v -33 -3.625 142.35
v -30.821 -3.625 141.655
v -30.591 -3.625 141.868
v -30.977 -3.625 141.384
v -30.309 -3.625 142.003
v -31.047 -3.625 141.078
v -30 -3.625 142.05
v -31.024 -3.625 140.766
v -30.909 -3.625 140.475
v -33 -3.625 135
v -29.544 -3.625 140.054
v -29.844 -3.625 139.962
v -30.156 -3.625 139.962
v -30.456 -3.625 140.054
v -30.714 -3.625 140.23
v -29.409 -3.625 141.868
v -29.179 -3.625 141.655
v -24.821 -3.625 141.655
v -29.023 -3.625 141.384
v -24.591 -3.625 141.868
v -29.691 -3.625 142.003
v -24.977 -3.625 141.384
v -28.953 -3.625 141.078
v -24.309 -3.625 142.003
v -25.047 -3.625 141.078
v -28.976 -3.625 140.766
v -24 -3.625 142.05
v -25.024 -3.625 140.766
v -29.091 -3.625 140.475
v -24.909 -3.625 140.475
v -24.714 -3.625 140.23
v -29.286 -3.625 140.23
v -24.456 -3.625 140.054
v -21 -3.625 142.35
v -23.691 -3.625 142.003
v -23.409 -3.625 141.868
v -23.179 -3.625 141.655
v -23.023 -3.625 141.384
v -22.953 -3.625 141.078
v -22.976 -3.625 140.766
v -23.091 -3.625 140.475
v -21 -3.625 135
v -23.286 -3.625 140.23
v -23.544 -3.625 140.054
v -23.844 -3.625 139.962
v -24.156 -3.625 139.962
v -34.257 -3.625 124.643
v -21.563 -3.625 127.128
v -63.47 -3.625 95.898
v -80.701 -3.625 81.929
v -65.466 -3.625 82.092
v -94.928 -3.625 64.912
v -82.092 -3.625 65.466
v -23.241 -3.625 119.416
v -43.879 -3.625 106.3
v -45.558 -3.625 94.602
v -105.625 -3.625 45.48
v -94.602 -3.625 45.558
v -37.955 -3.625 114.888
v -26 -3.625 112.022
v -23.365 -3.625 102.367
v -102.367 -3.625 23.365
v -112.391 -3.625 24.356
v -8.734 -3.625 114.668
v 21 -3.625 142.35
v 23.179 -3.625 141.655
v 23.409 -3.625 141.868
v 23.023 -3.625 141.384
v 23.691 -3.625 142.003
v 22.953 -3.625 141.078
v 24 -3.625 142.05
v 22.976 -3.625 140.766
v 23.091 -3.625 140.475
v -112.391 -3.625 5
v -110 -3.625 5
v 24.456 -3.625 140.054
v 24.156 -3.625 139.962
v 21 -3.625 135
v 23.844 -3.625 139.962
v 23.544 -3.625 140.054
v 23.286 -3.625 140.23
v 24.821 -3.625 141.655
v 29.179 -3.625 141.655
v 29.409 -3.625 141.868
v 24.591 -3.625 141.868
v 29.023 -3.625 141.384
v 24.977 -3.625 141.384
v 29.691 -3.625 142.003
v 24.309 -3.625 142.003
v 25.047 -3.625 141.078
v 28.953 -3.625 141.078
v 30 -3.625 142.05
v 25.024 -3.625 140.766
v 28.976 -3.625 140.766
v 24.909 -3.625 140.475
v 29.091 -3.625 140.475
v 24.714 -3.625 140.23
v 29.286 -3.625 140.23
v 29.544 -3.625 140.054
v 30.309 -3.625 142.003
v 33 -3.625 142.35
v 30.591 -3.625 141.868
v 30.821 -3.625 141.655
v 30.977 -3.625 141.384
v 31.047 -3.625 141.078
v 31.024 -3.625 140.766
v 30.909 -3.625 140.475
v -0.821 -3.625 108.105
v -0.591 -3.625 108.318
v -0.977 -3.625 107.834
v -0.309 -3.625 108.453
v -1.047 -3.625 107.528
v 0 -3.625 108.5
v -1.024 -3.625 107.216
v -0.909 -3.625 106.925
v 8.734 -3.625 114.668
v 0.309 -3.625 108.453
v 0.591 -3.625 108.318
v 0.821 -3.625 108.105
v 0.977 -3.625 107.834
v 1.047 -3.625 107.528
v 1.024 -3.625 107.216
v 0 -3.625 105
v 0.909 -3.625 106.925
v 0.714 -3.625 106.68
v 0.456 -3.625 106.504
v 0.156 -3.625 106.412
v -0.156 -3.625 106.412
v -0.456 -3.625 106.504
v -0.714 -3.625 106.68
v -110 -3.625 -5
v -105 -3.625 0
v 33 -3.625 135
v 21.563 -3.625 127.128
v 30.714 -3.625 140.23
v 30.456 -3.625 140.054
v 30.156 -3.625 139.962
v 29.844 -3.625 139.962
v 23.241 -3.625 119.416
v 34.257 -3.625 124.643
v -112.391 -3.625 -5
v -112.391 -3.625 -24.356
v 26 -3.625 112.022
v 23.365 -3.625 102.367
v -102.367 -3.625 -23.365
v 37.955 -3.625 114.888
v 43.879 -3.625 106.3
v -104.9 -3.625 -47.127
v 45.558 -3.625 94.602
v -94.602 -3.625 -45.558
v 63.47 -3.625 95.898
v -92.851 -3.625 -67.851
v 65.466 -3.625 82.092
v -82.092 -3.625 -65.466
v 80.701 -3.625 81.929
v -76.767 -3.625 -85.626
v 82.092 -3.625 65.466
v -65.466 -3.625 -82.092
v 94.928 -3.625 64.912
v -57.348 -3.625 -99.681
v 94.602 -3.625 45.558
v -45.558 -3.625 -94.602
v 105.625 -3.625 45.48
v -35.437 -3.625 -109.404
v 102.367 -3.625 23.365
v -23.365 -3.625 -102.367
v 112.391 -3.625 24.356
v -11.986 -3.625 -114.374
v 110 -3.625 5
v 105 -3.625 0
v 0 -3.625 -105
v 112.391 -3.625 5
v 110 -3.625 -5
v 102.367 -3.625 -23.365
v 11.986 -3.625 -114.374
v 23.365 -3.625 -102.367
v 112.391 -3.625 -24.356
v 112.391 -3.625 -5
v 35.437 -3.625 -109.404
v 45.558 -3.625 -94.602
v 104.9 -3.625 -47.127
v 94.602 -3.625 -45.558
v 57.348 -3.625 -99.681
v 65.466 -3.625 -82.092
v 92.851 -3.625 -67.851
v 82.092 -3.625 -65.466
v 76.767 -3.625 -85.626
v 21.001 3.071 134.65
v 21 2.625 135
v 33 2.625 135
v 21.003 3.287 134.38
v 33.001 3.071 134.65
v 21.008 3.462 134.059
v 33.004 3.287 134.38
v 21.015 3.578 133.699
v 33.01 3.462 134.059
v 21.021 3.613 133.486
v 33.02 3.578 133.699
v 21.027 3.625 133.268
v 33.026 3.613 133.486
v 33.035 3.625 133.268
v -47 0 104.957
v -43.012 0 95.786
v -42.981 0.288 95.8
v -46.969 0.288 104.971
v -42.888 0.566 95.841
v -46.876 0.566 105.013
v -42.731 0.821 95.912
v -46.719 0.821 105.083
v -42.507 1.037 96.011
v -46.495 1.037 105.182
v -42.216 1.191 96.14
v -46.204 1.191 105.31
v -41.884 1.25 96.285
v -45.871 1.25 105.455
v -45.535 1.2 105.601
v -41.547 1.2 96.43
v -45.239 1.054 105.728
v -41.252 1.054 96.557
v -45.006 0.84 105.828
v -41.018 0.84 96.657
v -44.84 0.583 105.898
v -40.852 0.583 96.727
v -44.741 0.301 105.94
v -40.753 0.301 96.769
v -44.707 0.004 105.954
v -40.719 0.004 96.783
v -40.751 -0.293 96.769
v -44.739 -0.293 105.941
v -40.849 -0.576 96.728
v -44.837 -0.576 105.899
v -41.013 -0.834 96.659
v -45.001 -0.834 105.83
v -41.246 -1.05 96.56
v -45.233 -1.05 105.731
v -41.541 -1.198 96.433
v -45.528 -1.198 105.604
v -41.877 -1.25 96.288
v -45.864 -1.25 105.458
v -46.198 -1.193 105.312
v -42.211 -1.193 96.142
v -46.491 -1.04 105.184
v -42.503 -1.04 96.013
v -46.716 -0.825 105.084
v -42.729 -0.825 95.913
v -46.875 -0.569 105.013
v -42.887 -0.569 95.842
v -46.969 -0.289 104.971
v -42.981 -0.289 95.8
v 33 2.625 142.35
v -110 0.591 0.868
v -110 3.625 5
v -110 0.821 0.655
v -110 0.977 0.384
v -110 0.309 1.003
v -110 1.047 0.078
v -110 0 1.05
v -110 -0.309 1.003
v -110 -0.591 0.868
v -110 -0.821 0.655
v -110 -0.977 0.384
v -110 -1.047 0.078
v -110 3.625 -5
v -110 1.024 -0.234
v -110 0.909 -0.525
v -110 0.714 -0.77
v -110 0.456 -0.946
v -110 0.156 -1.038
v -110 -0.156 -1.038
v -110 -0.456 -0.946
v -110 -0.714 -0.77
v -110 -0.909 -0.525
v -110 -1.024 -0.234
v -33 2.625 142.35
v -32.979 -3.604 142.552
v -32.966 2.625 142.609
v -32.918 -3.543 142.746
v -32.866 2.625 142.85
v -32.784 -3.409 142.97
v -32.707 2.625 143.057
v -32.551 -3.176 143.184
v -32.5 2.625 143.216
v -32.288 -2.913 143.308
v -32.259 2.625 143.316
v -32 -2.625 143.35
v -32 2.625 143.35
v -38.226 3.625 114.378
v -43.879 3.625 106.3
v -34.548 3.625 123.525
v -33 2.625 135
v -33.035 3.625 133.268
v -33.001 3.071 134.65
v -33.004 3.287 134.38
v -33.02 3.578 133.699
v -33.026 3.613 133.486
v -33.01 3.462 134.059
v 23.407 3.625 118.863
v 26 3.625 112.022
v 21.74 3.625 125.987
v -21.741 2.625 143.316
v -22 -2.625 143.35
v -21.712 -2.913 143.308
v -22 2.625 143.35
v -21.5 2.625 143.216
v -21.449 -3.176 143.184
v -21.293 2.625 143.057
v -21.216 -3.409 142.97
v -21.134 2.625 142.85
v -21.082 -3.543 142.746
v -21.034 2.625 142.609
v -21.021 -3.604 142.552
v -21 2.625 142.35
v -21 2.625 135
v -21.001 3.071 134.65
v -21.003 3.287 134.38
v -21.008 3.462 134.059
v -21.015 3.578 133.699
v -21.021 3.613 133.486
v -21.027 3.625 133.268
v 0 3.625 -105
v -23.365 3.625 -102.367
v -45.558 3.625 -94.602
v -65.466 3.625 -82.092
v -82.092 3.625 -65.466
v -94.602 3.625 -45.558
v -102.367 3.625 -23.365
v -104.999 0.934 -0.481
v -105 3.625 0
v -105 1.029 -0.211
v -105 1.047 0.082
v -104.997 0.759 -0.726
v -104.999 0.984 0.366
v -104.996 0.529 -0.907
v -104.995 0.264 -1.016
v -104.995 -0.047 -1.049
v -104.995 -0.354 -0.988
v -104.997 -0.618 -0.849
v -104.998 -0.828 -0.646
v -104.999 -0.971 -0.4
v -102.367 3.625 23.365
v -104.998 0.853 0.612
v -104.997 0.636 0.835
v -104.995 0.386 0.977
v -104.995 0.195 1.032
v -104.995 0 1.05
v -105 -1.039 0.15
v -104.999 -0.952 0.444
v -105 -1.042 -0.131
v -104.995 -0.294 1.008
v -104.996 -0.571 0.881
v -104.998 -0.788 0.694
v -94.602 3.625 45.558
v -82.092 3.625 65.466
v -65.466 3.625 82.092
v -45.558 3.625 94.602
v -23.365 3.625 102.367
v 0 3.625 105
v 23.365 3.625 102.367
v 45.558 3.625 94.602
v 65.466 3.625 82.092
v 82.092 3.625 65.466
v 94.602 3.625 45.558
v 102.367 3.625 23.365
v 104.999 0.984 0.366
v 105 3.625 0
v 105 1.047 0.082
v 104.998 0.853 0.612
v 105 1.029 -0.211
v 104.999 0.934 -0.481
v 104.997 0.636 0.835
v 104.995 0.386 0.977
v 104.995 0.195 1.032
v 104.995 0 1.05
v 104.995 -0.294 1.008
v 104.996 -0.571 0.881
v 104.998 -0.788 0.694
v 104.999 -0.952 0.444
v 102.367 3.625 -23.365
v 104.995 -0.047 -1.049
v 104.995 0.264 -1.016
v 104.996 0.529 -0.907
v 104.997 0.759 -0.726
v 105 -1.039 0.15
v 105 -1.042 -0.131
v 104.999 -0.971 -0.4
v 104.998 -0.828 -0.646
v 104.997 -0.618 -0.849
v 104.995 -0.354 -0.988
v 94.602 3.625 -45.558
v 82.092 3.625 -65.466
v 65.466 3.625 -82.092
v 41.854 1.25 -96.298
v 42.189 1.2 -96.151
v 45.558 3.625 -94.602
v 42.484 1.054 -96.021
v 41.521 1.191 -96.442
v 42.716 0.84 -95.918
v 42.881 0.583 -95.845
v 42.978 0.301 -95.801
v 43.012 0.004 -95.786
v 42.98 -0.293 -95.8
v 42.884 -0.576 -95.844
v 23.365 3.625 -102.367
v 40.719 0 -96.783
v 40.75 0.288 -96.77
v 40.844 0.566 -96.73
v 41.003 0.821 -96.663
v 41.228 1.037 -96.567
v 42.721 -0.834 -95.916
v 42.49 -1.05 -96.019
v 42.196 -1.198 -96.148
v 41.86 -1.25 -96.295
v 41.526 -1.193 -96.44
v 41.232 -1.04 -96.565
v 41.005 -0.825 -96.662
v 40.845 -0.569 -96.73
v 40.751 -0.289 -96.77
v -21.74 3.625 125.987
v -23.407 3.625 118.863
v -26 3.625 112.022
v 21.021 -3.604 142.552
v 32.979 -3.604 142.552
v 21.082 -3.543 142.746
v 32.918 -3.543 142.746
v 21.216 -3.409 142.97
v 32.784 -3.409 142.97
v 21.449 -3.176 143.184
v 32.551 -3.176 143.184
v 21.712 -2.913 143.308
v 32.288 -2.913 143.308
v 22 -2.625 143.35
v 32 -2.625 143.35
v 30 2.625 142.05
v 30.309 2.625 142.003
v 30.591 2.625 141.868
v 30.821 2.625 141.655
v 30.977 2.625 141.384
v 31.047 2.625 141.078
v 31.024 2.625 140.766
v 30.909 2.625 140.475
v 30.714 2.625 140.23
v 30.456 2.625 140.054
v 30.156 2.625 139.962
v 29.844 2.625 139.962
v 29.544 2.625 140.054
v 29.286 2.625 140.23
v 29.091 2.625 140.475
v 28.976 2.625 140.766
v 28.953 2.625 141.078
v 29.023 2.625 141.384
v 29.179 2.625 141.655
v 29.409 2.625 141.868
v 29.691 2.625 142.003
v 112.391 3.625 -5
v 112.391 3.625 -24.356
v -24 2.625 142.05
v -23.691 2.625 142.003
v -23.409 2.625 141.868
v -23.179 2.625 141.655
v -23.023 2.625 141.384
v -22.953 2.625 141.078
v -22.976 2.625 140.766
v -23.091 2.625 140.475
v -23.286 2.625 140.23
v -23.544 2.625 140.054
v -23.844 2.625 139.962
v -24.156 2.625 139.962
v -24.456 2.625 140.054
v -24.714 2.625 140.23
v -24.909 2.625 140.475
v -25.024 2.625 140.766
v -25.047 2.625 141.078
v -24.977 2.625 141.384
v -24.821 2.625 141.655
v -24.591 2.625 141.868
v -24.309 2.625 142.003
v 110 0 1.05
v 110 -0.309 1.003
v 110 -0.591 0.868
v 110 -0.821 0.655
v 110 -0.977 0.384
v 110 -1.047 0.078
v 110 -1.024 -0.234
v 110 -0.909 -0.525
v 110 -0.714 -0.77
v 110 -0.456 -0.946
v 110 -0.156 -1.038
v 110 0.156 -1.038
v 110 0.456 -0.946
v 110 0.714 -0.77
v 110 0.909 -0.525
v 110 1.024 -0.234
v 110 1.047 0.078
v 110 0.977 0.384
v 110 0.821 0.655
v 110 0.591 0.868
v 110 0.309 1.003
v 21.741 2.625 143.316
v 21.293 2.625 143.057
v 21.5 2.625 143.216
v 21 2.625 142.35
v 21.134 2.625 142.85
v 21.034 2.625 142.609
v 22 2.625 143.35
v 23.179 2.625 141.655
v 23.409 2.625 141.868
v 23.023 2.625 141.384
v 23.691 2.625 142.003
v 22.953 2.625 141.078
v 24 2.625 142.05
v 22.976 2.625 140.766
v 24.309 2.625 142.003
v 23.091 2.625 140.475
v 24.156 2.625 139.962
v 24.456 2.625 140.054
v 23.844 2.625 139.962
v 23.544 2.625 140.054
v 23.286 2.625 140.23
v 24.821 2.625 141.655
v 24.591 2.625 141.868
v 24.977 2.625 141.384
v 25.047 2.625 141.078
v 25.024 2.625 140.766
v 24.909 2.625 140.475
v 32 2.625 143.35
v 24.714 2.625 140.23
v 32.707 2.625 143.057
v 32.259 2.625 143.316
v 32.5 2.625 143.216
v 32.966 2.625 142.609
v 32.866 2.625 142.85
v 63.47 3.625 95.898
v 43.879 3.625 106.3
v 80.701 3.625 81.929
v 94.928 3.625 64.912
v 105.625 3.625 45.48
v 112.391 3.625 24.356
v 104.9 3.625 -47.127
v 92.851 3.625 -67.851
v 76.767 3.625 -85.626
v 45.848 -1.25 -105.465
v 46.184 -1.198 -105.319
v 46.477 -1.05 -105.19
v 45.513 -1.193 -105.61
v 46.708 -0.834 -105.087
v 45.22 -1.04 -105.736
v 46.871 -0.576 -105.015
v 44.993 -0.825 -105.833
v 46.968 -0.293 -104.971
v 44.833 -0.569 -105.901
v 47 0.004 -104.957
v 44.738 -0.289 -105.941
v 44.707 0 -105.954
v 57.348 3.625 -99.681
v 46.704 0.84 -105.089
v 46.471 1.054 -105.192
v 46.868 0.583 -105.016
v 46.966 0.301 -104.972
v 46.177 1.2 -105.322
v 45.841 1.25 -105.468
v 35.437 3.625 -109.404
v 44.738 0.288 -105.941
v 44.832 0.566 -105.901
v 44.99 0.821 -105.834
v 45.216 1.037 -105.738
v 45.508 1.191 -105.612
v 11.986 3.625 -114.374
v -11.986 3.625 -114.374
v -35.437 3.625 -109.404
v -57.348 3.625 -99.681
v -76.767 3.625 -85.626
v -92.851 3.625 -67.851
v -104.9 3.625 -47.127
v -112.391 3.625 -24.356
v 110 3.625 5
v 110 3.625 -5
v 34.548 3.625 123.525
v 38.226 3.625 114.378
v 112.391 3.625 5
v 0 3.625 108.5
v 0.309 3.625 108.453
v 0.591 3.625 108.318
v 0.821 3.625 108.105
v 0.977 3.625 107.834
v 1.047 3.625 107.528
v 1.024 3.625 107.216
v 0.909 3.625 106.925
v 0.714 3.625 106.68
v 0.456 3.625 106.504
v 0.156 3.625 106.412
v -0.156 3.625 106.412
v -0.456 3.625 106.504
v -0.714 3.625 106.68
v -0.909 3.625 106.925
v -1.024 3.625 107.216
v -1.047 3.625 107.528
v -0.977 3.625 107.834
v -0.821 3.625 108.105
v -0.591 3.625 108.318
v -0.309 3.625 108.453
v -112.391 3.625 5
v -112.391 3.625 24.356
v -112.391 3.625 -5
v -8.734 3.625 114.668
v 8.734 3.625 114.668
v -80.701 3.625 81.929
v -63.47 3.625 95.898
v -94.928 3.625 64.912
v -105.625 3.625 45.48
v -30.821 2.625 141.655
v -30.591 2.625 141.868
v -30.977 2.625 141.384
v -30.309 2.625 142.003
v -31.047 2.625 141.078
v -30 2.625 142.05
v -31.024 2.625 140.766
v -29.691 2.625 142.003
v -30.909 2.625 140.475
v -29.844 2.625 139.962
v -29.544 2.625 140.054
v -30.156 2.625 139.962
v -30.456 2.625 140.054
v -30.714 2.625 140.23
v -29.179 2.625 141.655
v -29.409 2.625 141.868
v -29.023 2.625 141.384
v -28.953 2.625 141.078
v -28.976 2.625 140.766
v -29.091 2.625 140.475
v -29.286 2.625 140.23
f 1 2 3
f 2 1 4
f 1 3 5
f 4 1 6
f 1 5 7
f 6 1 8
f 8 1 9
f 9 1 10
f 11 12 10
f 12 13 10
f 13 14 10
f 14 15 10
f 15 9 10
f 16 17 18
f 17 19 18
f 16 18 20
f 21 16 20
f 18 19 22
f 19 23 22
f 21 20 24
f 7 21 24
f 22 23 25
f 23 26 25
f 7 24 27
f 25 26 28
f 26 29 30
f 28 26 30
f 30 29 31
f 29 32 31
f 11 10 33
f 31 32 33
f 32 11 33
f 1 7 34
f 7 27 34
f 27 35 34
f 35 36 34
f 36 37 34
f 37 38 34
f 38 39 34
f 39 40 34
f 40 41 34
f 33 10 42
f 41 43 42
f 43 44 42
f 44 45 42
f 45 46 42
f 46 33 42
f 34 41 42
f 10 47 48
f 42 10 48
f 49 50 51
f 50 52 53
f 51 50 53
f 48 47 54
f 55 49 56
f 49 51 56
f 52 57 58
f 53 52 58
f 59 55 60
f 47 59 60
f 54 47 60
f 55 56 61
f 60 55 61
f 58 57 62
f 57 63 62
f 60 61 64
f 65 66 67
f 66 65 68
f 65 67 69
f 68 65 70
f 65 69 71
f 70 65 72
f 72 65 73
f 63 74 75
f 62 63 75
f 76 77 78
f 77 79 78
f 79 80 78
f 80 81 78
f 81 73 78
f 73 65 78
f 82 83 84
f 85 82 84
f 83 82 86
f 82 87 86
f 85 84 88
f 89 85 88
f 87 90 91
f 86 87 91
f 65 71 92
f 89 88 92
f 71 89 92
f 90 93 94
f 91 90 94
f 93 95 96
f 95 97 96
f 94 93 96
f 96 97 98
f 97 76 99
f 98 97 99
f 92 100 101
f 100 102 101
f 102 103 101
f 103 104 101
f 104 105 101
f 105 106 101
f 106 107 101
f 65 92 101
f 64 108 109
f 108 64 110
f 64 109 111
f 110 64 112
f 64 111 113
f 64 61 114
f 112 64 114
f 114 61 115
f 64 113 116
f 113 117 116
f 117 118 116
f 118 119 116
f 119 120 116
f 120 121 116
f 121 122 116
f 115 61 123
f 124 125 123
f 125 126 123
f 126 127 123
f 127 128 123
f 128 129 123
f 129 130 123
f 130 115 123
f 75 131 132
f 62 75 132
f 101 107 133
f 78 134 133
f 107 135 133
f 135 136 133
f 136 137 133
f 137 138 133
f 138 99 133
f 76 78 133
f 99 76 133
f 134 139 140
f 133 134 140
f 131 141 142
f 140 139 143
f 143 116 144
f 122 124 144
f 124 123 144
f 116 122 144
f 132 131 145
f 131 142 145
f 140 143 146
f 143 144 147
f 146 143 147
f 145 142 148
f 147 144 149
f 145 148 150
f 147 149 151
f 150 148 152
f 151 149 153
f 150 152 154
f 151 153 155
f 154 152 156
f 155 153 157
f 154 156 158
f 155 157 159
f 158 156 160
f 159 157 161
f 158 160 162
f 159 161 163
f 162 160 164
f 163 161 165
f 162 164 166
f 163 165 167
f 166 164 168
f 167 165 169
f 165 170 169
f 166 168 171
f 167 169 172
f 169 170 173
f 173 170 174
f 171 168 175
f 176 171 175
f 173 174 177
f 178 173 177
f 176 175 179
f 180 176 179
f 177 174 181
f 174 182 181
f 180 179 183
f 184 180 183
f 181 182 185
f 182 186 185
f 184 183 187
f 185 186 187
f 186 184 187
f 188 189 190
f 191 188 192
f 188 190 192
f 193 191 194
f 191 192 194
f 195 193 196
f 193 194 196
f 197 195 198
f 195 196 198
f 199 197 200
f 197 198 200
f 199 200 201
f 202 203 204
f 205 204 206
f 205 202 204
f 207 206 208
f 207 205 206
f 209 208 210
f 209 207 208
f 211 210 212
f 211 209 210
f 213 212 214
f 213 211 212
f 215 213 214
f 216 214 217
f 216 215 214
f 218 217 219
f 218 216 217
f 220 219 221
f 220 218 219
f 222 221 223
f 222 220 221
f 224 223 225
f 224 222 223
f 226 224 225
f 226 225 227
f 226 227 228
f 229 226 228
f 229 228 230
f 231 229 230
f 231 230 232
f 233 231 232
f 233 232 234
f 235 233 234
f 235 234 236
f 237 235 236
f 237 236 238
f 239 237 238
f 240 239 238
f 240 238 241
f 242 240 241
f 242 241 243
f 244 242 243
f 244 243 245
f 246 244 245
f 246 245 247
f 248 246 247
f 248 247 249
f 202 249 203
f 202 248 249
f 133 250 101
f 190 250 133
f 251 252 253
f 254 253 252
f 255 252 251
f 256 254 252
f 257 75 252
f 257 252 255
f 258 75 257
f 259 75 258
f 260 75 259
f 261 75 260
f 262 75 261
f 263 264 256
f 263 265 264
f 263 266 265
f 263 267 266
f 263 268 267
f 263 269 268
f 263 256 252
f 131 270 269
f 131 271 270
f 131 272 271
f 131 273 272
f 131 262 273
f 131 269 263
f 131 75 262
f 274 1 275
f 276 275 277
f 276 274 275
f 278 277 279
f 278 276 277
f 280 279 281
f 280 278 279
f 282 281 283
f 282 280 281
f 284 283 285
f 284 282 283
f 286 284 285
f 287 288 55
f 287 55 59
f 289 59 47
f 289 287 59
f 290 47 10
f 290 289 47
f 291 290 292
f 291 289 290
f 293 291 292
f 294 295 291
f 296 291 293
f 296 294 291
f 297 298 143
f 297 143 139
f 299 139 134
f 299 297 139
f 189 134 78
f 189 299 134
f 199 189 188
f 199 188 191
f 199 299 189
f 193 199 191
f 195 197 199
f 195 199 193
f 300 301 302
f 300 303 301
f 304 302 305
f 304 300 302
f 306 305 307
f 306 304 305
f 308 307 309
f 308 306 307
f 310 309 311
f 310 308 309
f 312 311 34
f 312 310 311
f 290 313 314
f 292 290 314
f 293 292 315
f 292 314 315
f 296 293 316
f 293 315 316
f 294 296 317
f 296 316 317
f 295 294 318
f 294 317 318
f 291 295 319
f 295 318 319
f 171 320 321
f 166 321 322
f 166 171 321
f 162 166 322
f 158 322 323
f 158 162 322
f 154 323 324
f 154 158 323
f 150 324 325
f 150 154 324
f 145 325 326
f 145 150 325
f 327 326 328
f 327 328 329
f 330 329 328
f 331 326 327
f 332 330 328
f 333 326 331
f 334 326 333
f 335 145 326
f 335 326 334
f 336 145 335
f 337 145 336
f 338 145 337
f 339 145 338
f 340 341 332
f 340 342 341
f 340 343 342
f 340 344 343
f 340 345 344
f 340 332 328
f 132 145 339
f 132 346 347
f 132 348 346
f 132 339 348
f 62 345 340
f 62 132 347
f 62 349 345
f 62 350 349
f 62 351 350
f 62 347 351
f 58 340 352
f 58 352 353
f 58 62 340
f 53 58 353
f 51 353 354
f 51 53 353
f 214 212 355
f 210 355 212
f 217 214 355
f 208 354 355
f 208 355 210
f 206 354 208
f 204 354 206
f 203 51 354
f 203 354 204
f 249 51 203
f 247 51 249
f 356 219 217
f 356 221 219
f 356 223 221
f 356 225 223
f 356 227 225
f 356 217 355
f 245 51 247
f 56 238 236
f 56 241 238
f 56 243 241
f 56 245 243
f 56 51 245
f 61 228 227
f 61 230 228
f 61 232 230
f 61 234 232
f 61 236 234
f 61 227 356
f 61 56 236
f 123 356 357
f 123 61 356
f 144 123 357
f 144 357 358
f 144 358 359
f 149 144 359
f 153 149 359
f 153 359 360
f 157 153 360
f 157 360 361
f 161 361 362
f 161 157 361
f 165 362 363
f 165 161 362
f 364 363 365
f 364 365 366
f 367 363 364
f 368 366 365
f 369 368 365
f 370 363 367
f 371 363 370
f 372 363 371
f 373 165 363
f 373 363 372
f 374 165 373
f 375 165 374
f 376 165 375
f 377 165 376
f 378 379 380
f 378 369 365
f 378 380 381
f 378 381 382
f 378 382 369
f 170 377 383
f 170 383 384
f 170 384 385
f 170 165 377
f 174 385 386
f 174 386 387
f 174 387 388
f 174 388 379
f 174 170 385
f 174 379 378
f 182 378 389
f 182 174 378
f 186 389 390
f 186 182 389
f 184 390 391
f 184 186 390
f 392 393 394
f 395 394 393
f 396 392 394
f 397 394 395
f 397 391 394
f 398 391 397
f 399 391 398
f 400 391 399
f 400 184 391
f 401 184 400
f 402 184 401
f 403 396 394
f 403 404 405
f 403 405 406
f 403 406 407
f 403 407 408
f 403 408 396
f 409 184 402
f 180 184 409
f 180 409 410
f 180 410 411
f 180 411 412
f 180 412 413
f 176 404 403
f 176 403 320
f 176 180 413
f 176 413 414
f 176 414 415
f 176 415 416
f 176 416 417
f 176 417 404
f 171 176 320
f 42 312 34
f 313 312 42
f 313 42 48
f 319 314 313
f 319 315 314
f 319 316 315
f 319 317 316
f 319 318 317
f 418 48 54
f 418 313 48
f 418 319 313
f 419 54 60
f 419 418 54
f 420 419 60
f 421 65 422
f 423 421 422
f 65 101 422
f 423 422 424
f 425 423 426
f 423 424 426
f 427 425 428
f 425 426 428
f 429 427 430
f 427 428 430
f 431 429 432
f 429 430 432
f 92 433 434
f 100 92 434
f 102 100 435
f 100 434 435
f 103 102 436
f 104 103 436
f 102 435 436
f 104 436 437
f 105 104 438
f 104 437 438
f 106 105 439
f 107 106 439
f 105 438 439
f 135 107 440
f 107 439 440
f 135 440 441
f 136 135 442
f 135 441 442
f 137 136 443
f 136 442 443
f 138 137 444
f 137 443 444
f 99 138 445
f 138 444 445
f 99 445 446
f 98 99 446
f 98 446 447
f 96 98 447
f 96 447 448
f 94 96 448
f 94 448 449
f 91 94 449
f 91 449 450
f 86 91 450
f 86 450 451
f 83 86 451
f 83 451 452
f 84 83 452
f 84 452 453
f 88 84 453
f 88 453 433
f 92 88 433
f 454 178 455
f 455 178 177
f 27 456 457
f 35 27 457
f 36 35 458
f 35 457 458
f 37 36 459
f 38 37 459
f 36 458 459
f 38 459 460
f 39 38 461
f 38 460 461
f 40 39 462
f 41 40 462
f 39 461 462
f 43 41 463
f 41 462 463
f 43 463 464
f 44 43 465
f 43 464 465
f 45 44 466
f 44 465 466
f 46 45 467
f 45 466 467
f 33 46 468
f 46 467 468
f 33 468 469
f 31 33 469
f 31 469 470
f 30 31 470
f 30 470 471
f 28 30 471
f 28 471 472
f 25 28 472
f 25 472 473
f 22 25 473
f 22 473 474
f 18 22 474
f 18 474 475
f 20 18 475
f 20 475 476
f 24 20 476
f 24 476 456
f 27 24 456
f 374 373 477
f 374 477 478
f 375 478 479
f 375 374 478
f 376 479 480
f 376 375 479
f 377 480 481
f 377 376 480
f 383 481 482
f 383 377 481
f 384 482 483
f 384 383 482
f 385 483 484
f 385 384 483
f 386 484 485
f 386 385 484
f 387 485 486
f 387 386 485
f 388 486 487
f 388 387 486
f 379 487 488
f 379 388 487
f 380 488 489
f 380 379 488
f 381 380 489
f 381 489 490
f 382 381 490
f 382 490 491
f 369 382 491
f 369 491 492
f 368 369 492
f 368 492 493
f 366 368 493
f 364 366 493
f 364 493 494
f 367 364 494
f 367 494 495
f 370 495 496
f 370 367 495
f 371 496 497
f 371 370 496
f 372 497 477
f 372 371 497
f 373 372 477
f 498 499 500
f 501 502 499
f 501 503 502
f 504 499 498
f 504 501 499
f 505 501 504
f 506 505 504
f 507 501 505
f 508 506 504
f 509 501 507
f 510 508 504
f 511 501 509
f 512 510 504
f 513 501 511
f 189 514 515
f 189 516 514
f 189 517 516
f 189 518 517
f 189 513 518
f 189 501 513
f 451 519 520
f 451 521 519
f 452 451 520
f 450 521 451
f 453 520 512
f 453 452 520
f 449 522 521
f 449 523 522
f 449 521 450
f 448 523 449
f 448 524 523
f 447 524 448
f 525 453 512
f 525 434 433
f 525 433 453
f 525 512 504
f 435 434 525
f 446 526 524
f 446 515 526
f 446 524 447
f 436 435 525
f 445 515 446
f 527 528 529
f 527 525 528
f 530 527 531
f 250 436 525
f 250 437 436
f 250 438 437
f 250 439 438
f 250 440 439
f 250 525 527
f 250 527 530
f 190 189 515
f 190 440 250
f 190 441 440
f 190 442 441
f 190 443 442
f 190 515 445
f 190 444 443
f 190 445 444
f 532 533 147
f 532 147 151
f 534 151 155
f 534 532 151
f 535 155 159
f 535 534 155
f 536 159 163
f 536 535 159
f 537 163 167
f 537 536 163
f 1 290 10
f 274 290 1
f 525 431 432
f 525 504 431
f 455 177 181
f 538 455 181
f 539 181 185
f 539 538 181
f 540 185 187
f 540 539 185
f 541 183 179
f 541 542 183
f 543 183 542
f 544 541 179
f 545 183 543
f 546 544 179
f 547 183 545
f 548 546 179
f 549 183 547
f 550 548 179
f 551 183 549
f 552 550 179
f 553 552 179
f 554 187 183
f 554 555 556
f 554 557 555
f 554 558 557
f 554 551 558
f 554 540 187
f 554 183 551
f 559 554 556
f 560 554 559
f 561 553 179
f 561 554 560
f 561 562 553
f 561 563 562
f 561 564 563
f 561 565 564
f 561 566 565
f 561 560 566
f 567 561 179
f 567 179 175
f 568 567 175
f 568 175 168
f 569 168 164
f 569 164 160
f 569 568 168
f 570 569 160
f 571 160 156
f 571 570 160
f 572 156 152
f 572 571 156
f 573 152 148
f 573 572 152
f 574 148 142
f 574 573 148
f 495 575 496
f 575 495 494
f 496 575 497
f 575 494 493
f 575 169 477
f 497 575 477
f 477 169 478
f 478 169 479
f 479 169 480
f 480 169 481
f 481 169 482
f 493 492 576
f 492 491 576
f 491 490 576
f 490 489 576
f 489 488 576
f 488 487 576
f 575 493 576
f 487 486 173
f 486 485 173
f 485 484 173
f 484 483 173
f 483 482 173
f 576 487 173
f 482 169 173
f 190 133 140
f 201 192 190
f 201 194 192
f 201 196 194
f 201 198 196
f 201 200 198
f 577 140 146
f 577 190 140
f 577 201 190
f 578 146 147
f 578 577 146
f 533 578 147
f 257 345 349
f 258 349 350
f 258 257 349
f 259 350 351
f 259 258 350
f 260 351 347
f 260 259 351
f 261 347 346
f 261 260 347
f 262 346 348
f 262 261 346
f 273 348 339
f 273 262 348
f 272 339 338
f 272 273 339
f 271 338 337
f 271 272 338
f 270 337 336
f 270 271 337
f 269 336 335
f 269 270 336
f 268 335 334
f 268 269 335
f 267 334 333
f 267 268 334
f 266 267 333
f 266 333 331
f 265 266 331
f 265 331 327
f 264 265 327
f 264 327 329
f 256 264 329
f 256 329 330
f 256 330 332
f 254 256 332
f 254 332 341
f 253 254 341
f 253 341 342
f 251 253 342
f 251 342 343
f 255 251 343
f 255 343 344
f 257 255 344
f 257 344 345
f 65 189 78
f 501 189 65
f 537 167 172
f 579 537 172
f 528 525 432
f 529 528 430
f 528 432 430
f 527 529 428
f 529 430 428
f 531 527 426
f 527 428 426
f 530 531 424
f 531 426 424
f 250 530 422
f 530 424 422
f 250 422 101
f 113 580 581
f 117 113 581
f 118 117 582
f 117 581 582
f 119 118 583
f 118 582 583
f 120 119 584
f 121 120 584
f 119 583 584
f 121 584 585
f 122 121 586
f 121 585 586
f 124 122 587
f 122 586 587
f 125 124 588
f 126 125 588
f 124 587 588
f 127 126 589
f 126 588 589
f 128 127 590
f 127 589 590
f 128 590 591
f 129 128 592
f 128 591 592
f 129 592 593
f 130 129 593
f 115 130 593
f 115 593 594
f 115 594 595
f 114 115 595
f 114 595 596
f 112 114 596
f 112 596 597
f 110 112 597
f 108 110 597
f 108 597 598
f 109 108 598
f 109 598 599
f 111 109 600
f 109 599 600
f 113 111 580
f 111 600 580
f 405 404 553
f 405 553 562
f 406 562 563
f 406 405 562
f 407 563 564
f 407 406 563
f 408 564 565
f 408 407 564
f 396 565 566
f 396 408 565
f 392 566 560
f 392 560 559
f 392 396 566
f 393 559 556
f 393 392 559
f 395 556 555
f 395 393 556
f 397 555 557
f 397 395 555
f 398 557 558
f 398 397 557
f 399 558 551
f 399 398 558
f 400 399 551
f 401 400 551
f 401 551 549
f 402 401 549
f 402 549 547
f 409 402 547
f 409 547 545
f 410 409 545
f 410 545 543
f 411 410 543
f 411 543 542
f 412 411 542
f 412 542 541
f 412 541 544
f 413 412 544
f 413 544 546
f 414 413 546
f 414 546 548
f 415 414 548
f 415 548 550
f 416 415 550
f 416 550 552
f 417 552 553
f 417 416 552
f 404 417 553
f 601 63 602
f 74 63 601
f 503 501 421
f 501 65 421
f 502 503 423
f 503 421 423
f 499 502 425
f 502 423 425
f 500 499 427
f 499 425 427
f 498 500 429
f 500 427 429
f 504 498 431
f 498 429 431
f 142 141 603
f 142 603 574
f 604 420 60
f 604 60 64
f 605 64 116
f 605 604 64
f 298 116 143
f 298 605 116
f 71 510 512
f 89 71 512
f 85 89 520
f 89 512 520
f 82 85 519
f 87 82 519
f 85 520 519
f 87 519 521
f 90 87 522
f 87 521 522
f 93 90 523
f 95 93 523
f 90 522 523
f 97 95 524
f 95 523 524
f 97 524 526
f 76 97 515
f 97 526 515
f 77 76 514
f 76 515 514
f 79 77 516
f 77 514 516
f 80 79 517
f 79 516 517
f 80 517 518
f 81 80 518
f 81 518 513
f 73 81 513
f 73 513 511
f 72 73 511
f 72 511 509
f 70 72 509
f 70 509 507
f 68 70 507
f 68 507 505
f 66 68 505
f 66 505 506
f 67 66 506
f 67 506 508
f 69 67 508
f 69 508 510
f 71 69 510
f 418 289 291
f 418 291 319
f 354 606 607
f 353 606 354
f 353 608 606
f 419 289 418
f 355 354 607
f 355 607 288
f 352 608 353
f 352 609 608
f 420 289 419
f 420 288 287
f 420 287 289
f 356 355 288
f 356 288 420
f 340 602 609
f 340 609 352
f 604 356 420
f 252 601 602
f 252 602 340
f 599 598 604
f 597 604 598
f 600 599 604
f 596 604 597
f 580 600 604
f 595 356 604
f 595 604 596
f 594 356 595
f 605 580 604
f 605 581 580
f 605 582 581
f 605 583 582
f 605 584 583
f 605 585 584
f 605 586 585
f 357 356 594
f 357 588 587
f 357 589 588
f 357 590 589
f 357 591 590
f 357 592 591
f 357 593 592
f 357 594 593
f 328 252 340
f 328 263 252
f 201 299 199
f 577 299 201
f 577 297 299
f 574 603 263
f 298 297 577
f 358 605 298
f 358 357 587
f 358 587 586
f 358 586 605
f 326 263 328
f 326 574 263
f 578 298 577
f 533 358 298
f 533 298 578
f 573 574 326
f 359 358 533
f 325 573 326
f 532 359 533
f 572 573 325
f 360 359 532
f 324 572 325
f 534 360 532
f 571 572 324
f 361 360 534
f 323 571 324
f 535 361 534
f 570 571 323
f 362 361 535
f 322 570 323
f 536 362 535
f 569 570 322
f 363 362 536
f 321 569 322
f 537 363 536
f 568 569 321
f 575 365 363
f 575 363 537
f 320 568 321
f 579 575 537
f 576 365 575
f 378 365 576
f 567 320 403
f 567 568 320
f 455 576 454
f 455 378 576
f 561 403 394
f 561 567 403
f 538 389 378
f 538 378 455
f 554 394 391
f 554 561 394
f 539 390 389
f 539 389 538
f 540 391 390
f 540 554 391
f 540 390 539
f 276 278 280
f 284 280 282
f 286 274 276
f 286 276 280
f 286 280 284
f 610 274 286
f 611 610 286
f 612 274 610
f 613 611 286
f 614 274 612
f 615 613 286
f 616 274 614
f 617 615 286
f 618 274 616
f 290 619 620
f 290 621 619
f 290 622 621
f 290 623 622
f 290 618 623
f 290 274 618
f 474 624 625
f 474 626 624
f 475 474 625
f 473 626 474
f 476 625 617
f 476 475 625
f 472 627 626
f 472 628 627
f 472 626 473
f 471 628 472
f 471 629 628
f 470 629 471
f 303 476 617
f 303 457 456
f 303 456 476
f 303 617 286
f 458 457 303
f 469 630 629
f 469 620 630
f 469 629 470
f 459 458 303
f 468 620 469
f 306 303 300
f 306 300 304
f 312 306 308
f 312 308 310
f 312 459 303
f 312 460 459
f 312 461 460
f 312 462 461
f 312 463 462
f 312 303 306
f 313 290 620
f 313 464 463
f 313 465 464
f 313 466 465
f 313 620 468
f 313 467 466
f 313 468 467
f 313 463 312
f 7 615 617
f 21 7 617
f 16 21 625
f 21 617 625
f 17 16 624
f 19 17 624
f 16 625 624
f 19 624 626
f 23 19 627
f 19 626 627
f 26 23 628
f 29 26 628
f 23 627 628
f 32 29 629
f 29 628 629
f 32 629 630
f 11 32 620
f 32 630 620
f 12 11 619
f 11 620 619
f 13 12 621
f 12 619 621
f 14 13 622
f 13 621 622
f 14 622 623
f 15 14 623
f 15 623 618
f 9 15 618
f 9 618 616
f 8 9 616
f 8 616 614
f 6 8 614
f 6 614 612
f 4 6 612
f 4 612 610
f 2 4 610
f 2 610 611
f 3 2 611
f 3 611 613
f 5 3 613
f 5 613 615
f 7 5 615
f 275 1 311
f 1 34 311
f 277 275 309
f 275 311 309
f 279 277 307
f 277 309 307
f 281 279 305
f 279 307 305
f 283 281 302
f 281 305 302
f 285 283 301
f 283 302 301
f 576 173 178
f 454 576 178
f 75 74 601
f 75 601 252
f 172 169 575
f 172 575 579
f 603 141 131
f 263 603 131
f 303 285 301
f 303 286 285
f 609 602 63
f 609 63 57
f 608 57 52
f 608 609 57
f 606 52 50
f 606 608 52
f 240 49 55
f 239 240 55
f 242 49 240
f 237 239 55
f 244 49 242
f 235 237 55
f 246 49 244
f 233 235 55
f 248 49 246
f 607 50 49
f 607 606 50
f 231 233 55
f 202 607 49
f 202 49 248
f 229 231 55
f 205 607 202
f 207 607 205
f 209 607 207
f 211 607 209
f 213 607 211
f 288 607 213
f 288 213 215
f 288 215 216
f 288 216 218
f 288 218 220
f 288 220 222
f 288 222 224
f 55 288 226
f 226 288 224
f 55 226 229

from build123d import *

# Parameters (mm, degrees)
SKETCH2_R               = 105
BOSS_EXTRUDE1_DEPTH     = 3.625
CUT_EXTRUDE1_DEPTH      = 184.813392126
CUT_EXTRUDE1_DEPTH_BACK = 184.813392126
SKETCH4_R               = 1.25
SKETCH7_R               = 1.05
CUT_EXTRUDE2_DEPTH      = 184.920594346
CUT_EXTRUDE3_DEPTH      = 184.813392191
CUT_EXTRUDE3_DEPTH_BACK = 184.813392191
SKETCH9_R               = 1.05
CUT_EXTRUDE4_DEPTH      = 184.813392192
CUT_EXTRUDE4_DEPTH_BACK = 184.813392192
SKETCH10_W              = 20
SKETCH10_H              = 10
CUT_EXTRUDE5_DEPTH      = 184.745375857
CUT_EXTRUDE5_DEPTH_BACK = 184.745375857
SKETCH11_W              = 30
SKETCH11_H              = 90
SKETCH12_R              = 1.05
CUT_EXTRUDE6_DEPTH      = 7.25
FILLET1_R               = 1
SKETCH13_W              = 130
SKETCH13_H              = 10
CUT_EXTRUDE7_DEPTH      = 1
FILLET2_R               = 2


with BuildPart() as part:
    # Sketch2 → Boss-Extrude1 (new, symmetric)
    with BuildSketch(Plane(origin=(0, 0, 0), x_dir=(1, 0, 0), z_dir=(0, 1, 0))):
        with BuildLine():
            Line((-33, -135), (-33, -143.35))
            Line((-33, -143.35), (-21, -143.35))
            Line((-21, -143.35), (-21, -135))
            ThreePointArc((-21, -135), (-22.264456843, -123.242302365), (-26, -112.022319205))
            ThreePointArc((-26, -112.022319205), (0, -115), (26, -112.022319205))
            ThreePointArc((26, -112.022319205), (22.264456843, -123.242302365), (21, -135))
            Line((21, -135), (21, -143.35))
            Line((21, -143.35), (33, -143.35))
            Line((33, -143.35), (33, -135))
            ThreePointArc((33, -135), (35.810957179, -119.65357728), (43.878842197, -106.299798718))
            ThreePointArc((43.878842197, -106.299798718), (0, 115), (-43.878842197, -106.299798718))
            ThreePointArc((-43.878842197, -106.299798718), (-35.810957179, -119.65357728), (-33, -135))
        make_face()
        with Locations(Location((0, 0, 0), (0, 0, 90))):
            Circle(SKETCH2_R, mode=Mode.SUBTRACT)
    extrude(amount=BOSS_EXTRUDE1_DEPTH, both=True)

    # Sketch4 → Cut-Extrude1 (cut, two sides: drawn at the far end of the back side and taken through both)
    with BuildSketch(Plane(origin=(0, 0, 0), x_dir=(0, 1, 0), z_dir=(0.39874906892524387, 0, -0.9170600743851252)).offset(-CUT_EXTRUDE1_DEPTH_BACK)):
        with Locations(Location((0, 0, 0), (0, 0, 270))):
            Circle(SKETCH4_R)
    extrude(amount=CUT_EXTRUDE1_DEPTH + CUT_EXTRUDE1_DEPTH_BACK, mode=Mode.SUBTRACT)

    # Sketch7 → Cut-Extrude2 (cut, through all)
    with BuildSketch(Plane(origin=(0, 3.625, 0), x_dir=(1, 0, 0), z_dir=(0, 1, 0))):
        with Locations(Location((-30, -141, 0), (0, 0, 270))):
            Circle(SKETCH7_R)
        with Locations(Location((-24, -141, 0), (0, 0, 270))):
            Circle(SKETCH7_R)
        with Locations(Location((24, -141, 0), (0, 0, 270))):
            Circle(SKETCH7_R)
        with Locations(Location((30, -141, 0), (0, 0, 270))):
            Circle(SKETCH7_R)
    extrude(amount=-CUT_EXTRUDE2_DEPTH, mode=Mode.SUBTRACT)

    # Sketch9 → Cut-Extrude3 (cut, two sides: drawn at the far end of the back side and taken through both)
    with BuildSketch(Plane(origin=(0, 0, 0), x_dir=(0, 0, -1), z_dir=(1, 0, 0)).offset(-CUT_EXTRUDE3_DEPTH_BACK)):
        with Locations(Location((0, 0, 0), (0, 0, 180))):
            Circle(SKETCH9_R)
    extrude(amount=CUT_EXTRUDE3_DEPTH + CUT_EXTRUDE3_DEPTH_BACK, mode=Mode.SUBTRACT)

    # Sketch10 → Cut-Extrude4 (cut, two sides: drawn at the far end of the back side and taken through both)
    with BuildSketch(Plane(origin=(0, 0, 0), x_dir=(1, 0, 0), z_dir=(0, 1, 0)).offset(-CUT_EXTRUDE4_DEPTH_BACK)):
        with Locations((-120, 0)):
            Rectangle(SKETCH10_W, SKETCH10_H)
        with Locations((120, 0)):
            Rectangle(SKETCH10_W, SKETCH10_H)
    extrude(amount=CUT_EXTRUDE4_DEPTH + CUT_EXTRUDE4_DEPTH_BACK, mode=Mode.SUBTRACT)

    # Sketch11 → Cut-Extrude5 (cut, two sides: drawn at the far end of the back side and taken through both)
    with BuildSketch(Plane(origin=(0, 0, 0), x_dir=(1, 0, 0), z_dir=(0, 1, 0)).offset(-CUT_EXTRUDE5_DEPTH_BACK)):
        with Locations((-127.391252931, 0)):
            Rectangle(SKETCH11_W, SKETCH11_H)
        with Locations((127.391252931, 0)):
            Rectangle(SKETCH11_W, SKETCH11_H)
    extrude(amount=CUT_EXTRUDE5_DEPTH + CUT_EXTRUDE5_DEPTH_BACK, mode=Mode.SUBTRACT)

    # Sketch12 → Cut-Extrude6 (cut)
    with BuildSketch(Plane(origin=(0, 3.625, 0), x_dir=(1, 0, 0), z_dir=(0, 1, 0))):
        with Locations(Location((0, -107.45, 0), (0, 0, 270))):
            Circle(SKETCH12_R)
    extrude(amount=-CUT_EXTRUDE6_DEPTH, mode=Mode.SUBTRACT)

    # Fillet1
    fillet1_edges = [part.edges().sort_by_distance(p)[0] for p in [
        (-27, -3.625, 143.35),
        (27, -3.625, 143.35),
        (-21, 0, 143.35),
        (-33, 0, 143.35),
        (27, 3.625, 143.35),
        (33, 0, 143.35),
        (21, 0, 143.35),
        (-27, 3.625, 143.35),
    ]]
    fillet(fillet1_edges, radius=FILLET1_R)

    # Sketch13 → Cut-Extrude7 (cut)
    with BuildSketch(Plane(origin=(0, 3.625, 0), x_dir=(1, 0, 0), z_dir=(0, 1, 0))):
        with Locations((0, -140)):
            Rectangle(SKETCH13_W, SKETCH13_H)
    extrude(amount=-CUT_EXTRUDE7_DEPTH, mode=Mode.SUBTRACT)

    # Fillet2
    # the kernel refuses this fillet: 2 mm, written as the material it takes off along each edge
    with BuildSketch(Plane(origin=(37.330127019, 3.625, 135), x_dir=(0, 0, -1), z_dir=(-1, 0, 0))) as fillet2_piece_1:
        with BuildLine():
            CenterArc((1.732050808, 2), FILLET2_R, 210, 60)
            Line((0, 1), (-0.034641016, 0.98))
            ThreePointArc((-0.034641016, 0.98), (-0.04, 0.5), (-0.04, 0))
            Line((-0.04, 0), (0, -0.04))
            Line((0, -0.04), (1.732050808, -0.04))
            Line((1.732050808, -0.04), (1.732050808, 0))
        make_face()
    extrude(amount=20.660254038, mode=Mode.SUBTRACT)
    with BuildSketch(Plane(origin=(-16.669872981, 3.625, 135), x_dir=(0, -1, 0), z_dir=(-1, 0, 0))) as fillet2_piece_2:
        with BuildLine():
            CenterArc((2, -1.732050808), FILLET2_R, 120, 60)
            Line((0, -1.732050808), (-0.04, -1.732050808))
            Line((-0.04, -1.732050808), (-0.04, 0))
            Line((-0.04, 0), (0, 0.04))
            ThreePointArc((0, 0.04), (0.5, 0.04), (0.98, 0.034641016))
            Line((0.98, 0.034641016), (1, 0))
        make_face()
    extrude(amount=20.660254038, mode=Mode.SUBTRACT)


solid = part.part
